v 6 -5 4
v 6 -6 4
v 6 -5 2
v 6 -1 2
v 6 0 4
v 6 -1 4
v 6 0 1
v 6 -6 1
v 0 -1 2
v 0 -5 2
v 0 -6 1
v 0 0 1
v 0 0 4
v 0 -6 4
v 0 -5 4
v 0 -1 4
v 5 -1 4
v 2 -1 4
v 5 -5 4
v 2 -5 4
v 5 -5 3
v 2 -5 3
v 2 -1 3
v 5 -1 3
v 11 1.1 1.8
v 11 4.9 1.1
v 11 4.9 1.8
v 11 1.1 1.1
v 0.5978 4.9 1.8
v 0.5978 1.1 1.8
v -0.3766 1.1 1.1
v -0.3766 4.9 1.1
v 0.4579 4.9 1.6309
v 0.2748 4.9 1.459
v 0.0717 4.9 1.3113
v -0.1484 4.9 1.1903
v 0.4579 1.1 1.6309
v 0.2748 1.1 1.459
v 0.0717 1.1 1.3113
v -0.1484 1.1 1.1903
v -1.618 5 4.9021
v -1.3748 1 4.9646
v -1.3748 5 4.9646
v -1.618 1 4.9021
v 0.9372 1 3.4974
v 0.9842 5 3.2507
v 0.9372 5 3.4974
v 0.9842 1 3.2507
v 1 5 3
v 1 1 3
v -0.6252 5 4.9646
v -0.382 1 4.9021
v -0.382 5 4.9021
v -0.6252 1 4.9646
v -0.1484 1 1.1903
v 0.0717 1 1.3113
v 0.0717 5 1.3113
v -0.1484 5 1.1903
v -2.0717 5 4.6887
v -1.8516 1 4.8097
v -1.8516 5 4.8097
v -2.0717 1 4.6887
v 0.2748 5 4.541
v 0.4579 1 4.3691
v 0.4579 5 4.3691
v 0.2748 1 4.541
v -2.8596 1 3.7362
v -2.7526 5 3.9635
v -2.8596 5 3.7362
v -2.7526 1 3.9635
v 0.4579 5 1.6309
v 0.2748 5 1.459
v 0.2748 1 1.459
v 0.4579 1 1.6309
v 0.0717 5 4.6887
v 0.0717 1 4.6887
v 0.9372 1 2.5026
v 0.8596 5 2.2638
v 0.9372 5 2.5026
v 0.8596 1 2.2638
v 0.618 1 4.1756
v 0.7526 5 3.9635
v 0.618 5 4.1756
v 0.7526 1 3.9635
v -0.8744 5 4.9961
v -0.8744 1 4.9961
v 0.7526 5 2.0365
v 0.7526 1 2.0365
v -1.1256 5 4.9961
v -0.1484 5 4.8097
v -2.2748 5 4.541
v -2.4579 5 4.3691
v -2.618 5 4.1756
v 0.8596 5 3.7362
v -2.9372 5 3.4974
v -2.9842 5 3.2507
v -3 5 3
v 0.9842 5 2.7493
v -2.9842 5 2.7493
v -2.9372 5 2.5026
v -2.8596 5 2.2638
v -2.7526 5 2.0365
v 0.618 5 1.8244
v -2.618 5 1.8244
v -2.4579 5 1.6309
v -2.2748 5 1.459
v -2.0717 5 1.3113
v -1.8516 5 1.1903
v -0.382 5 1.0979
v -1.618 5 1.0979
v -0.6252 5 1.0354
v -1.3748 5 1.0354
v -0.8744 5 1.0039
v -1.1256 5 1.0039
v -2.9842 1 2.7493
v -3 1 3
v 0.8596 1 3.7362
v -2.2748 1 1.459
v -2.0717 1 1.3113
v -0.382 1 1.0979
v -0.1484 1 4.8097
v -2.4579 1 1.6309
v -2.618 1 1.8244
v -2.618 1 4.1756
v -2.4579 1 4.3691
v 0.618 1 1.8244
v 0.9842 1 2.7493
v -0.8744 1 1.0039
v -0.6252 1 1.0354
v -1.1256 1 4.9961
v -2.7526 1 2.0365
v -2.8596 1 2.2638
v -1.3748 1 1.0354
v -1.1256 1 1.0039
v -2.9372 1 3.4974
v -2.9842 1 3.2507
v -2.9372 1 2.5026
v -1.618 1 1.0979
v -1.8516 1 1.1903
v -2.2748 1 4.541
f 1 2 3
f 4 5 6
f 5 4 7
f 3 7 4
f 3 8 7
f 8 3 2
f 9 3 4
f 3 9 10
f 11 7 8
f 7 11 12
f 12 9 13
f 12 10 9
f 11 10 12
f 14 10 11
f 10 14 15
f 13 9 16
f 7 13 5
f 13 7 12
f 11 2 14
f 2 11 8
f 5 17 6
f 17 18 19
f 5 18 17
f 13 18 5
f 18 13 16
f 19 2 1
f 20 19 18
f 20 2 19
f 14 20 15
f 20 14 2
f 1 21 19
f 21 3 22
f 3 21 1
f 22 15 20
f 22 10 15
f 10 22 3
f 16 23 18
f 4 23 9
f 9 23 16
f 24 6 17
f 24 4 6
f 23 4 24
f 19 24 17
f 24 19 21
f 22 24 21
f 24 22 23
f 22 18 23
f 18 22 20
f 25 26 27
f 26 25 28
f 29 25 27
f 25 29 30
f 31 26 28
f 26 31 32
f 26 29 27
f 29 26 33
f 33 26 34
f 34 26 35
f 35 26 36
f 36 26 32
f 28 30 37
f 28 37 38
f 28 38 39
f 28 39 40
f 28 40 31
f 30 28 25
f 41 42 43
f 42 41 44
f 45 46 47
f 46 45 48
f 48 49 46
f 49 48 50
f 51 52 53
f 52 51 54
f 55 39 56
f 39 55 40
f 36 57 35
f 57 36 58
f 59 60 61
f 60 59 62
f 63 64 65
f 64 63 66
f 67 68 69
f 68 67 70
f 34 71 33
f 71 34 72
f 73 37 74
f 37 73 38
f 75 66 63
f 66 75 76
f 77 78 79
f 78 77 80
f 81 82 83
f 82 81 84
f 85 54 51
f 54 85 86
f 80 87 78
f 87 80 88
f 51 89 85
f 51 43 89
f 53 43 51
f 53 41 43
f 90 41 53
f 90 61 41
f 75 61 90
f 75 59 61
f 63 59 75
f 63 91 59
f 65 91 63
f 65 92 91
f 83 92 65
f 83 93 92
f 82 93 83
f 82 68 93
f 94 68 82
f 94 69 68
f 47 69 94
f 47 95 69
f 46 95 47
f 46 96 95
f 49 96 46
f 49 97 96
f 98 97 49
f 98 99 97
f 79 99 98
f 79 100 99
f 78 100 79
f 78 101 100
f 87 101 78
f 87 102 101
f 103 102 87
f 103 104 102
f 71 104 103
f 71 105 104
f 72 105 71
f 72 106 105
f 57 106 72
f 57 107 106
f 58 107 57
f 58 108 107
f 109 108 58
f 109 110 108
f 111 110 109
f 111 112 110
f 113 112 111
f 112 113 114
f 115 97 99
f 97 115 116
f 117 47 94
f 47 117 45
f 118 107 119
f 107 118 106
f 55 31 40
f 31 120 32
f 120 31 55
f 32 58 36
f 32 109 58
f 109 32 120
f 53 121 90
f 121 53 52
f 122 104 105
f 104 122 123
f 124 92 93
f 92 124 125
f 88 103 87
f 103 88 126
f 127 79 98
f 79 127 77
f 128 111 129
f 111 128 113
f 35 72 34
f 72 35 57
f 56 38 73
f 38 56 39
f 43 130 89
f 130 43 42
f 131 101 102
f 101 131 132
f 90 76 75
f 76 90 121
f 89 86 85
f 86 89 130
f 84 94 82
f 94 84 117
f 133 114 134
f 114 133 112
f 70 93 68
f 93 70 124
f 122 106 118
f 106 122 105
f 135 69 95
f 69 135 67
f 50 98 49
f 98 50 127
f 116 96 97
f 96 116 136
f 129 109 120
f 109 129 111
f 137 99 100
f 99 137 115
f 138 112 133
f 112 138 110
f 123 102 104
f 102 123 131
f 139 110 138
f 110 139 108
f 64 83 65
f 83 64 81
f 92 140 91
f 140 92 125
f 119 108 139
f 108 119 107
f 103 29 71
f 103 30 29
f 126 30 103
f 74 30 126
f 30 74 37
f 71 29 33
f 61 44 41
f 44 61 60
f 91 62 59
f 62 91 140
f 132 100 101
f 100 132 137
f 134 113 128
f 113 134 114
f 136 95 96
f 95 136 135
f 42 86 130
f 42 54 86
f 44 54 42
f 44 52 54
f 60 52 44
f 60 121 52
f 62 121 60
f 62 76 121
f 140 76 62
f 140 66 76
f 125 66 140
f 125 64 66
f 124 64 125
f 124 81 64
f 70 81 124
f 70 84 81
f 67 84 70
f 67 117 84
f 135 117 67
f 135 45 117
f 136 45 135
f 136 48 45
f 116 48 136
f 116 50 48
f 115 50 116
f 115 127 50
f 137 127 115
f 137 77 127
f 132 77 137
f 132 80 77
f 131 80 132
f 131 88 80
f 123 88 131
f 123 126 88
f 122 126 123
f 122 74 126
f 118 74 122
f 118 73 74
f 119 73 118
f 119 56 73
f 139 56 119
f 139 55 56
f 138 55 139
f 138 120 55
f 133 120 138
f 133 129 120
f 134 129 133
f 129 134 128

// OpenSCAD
// file: pulley.scad
module outer_box(){
 	cube([6,6,1]);
 
 	translate([0,0,1])
 		cube([6,1,2]);
 
 	translate([0,5,1])
 		cube([6,1,2]);
 
 	translate([2,1,2])
 		cube([3,4,1]);
 }
 
 module inner_slide(){
 	color("blue")
 		translate([-1, 1.1, 1.1]){
 			cube([12, 3.8, 0.7]);
 			cube([1, 3.8, 2]);
 	}
 }
 
 % outer_box();
 inner_slide();
// main file
use <pulley.scad>;

translate([0,-6,1])
outer_box();

inner_slide();

translate([-1,5,3])
rotate([90,0,0])
cylinder(r=2, h=4, $fn=50);
